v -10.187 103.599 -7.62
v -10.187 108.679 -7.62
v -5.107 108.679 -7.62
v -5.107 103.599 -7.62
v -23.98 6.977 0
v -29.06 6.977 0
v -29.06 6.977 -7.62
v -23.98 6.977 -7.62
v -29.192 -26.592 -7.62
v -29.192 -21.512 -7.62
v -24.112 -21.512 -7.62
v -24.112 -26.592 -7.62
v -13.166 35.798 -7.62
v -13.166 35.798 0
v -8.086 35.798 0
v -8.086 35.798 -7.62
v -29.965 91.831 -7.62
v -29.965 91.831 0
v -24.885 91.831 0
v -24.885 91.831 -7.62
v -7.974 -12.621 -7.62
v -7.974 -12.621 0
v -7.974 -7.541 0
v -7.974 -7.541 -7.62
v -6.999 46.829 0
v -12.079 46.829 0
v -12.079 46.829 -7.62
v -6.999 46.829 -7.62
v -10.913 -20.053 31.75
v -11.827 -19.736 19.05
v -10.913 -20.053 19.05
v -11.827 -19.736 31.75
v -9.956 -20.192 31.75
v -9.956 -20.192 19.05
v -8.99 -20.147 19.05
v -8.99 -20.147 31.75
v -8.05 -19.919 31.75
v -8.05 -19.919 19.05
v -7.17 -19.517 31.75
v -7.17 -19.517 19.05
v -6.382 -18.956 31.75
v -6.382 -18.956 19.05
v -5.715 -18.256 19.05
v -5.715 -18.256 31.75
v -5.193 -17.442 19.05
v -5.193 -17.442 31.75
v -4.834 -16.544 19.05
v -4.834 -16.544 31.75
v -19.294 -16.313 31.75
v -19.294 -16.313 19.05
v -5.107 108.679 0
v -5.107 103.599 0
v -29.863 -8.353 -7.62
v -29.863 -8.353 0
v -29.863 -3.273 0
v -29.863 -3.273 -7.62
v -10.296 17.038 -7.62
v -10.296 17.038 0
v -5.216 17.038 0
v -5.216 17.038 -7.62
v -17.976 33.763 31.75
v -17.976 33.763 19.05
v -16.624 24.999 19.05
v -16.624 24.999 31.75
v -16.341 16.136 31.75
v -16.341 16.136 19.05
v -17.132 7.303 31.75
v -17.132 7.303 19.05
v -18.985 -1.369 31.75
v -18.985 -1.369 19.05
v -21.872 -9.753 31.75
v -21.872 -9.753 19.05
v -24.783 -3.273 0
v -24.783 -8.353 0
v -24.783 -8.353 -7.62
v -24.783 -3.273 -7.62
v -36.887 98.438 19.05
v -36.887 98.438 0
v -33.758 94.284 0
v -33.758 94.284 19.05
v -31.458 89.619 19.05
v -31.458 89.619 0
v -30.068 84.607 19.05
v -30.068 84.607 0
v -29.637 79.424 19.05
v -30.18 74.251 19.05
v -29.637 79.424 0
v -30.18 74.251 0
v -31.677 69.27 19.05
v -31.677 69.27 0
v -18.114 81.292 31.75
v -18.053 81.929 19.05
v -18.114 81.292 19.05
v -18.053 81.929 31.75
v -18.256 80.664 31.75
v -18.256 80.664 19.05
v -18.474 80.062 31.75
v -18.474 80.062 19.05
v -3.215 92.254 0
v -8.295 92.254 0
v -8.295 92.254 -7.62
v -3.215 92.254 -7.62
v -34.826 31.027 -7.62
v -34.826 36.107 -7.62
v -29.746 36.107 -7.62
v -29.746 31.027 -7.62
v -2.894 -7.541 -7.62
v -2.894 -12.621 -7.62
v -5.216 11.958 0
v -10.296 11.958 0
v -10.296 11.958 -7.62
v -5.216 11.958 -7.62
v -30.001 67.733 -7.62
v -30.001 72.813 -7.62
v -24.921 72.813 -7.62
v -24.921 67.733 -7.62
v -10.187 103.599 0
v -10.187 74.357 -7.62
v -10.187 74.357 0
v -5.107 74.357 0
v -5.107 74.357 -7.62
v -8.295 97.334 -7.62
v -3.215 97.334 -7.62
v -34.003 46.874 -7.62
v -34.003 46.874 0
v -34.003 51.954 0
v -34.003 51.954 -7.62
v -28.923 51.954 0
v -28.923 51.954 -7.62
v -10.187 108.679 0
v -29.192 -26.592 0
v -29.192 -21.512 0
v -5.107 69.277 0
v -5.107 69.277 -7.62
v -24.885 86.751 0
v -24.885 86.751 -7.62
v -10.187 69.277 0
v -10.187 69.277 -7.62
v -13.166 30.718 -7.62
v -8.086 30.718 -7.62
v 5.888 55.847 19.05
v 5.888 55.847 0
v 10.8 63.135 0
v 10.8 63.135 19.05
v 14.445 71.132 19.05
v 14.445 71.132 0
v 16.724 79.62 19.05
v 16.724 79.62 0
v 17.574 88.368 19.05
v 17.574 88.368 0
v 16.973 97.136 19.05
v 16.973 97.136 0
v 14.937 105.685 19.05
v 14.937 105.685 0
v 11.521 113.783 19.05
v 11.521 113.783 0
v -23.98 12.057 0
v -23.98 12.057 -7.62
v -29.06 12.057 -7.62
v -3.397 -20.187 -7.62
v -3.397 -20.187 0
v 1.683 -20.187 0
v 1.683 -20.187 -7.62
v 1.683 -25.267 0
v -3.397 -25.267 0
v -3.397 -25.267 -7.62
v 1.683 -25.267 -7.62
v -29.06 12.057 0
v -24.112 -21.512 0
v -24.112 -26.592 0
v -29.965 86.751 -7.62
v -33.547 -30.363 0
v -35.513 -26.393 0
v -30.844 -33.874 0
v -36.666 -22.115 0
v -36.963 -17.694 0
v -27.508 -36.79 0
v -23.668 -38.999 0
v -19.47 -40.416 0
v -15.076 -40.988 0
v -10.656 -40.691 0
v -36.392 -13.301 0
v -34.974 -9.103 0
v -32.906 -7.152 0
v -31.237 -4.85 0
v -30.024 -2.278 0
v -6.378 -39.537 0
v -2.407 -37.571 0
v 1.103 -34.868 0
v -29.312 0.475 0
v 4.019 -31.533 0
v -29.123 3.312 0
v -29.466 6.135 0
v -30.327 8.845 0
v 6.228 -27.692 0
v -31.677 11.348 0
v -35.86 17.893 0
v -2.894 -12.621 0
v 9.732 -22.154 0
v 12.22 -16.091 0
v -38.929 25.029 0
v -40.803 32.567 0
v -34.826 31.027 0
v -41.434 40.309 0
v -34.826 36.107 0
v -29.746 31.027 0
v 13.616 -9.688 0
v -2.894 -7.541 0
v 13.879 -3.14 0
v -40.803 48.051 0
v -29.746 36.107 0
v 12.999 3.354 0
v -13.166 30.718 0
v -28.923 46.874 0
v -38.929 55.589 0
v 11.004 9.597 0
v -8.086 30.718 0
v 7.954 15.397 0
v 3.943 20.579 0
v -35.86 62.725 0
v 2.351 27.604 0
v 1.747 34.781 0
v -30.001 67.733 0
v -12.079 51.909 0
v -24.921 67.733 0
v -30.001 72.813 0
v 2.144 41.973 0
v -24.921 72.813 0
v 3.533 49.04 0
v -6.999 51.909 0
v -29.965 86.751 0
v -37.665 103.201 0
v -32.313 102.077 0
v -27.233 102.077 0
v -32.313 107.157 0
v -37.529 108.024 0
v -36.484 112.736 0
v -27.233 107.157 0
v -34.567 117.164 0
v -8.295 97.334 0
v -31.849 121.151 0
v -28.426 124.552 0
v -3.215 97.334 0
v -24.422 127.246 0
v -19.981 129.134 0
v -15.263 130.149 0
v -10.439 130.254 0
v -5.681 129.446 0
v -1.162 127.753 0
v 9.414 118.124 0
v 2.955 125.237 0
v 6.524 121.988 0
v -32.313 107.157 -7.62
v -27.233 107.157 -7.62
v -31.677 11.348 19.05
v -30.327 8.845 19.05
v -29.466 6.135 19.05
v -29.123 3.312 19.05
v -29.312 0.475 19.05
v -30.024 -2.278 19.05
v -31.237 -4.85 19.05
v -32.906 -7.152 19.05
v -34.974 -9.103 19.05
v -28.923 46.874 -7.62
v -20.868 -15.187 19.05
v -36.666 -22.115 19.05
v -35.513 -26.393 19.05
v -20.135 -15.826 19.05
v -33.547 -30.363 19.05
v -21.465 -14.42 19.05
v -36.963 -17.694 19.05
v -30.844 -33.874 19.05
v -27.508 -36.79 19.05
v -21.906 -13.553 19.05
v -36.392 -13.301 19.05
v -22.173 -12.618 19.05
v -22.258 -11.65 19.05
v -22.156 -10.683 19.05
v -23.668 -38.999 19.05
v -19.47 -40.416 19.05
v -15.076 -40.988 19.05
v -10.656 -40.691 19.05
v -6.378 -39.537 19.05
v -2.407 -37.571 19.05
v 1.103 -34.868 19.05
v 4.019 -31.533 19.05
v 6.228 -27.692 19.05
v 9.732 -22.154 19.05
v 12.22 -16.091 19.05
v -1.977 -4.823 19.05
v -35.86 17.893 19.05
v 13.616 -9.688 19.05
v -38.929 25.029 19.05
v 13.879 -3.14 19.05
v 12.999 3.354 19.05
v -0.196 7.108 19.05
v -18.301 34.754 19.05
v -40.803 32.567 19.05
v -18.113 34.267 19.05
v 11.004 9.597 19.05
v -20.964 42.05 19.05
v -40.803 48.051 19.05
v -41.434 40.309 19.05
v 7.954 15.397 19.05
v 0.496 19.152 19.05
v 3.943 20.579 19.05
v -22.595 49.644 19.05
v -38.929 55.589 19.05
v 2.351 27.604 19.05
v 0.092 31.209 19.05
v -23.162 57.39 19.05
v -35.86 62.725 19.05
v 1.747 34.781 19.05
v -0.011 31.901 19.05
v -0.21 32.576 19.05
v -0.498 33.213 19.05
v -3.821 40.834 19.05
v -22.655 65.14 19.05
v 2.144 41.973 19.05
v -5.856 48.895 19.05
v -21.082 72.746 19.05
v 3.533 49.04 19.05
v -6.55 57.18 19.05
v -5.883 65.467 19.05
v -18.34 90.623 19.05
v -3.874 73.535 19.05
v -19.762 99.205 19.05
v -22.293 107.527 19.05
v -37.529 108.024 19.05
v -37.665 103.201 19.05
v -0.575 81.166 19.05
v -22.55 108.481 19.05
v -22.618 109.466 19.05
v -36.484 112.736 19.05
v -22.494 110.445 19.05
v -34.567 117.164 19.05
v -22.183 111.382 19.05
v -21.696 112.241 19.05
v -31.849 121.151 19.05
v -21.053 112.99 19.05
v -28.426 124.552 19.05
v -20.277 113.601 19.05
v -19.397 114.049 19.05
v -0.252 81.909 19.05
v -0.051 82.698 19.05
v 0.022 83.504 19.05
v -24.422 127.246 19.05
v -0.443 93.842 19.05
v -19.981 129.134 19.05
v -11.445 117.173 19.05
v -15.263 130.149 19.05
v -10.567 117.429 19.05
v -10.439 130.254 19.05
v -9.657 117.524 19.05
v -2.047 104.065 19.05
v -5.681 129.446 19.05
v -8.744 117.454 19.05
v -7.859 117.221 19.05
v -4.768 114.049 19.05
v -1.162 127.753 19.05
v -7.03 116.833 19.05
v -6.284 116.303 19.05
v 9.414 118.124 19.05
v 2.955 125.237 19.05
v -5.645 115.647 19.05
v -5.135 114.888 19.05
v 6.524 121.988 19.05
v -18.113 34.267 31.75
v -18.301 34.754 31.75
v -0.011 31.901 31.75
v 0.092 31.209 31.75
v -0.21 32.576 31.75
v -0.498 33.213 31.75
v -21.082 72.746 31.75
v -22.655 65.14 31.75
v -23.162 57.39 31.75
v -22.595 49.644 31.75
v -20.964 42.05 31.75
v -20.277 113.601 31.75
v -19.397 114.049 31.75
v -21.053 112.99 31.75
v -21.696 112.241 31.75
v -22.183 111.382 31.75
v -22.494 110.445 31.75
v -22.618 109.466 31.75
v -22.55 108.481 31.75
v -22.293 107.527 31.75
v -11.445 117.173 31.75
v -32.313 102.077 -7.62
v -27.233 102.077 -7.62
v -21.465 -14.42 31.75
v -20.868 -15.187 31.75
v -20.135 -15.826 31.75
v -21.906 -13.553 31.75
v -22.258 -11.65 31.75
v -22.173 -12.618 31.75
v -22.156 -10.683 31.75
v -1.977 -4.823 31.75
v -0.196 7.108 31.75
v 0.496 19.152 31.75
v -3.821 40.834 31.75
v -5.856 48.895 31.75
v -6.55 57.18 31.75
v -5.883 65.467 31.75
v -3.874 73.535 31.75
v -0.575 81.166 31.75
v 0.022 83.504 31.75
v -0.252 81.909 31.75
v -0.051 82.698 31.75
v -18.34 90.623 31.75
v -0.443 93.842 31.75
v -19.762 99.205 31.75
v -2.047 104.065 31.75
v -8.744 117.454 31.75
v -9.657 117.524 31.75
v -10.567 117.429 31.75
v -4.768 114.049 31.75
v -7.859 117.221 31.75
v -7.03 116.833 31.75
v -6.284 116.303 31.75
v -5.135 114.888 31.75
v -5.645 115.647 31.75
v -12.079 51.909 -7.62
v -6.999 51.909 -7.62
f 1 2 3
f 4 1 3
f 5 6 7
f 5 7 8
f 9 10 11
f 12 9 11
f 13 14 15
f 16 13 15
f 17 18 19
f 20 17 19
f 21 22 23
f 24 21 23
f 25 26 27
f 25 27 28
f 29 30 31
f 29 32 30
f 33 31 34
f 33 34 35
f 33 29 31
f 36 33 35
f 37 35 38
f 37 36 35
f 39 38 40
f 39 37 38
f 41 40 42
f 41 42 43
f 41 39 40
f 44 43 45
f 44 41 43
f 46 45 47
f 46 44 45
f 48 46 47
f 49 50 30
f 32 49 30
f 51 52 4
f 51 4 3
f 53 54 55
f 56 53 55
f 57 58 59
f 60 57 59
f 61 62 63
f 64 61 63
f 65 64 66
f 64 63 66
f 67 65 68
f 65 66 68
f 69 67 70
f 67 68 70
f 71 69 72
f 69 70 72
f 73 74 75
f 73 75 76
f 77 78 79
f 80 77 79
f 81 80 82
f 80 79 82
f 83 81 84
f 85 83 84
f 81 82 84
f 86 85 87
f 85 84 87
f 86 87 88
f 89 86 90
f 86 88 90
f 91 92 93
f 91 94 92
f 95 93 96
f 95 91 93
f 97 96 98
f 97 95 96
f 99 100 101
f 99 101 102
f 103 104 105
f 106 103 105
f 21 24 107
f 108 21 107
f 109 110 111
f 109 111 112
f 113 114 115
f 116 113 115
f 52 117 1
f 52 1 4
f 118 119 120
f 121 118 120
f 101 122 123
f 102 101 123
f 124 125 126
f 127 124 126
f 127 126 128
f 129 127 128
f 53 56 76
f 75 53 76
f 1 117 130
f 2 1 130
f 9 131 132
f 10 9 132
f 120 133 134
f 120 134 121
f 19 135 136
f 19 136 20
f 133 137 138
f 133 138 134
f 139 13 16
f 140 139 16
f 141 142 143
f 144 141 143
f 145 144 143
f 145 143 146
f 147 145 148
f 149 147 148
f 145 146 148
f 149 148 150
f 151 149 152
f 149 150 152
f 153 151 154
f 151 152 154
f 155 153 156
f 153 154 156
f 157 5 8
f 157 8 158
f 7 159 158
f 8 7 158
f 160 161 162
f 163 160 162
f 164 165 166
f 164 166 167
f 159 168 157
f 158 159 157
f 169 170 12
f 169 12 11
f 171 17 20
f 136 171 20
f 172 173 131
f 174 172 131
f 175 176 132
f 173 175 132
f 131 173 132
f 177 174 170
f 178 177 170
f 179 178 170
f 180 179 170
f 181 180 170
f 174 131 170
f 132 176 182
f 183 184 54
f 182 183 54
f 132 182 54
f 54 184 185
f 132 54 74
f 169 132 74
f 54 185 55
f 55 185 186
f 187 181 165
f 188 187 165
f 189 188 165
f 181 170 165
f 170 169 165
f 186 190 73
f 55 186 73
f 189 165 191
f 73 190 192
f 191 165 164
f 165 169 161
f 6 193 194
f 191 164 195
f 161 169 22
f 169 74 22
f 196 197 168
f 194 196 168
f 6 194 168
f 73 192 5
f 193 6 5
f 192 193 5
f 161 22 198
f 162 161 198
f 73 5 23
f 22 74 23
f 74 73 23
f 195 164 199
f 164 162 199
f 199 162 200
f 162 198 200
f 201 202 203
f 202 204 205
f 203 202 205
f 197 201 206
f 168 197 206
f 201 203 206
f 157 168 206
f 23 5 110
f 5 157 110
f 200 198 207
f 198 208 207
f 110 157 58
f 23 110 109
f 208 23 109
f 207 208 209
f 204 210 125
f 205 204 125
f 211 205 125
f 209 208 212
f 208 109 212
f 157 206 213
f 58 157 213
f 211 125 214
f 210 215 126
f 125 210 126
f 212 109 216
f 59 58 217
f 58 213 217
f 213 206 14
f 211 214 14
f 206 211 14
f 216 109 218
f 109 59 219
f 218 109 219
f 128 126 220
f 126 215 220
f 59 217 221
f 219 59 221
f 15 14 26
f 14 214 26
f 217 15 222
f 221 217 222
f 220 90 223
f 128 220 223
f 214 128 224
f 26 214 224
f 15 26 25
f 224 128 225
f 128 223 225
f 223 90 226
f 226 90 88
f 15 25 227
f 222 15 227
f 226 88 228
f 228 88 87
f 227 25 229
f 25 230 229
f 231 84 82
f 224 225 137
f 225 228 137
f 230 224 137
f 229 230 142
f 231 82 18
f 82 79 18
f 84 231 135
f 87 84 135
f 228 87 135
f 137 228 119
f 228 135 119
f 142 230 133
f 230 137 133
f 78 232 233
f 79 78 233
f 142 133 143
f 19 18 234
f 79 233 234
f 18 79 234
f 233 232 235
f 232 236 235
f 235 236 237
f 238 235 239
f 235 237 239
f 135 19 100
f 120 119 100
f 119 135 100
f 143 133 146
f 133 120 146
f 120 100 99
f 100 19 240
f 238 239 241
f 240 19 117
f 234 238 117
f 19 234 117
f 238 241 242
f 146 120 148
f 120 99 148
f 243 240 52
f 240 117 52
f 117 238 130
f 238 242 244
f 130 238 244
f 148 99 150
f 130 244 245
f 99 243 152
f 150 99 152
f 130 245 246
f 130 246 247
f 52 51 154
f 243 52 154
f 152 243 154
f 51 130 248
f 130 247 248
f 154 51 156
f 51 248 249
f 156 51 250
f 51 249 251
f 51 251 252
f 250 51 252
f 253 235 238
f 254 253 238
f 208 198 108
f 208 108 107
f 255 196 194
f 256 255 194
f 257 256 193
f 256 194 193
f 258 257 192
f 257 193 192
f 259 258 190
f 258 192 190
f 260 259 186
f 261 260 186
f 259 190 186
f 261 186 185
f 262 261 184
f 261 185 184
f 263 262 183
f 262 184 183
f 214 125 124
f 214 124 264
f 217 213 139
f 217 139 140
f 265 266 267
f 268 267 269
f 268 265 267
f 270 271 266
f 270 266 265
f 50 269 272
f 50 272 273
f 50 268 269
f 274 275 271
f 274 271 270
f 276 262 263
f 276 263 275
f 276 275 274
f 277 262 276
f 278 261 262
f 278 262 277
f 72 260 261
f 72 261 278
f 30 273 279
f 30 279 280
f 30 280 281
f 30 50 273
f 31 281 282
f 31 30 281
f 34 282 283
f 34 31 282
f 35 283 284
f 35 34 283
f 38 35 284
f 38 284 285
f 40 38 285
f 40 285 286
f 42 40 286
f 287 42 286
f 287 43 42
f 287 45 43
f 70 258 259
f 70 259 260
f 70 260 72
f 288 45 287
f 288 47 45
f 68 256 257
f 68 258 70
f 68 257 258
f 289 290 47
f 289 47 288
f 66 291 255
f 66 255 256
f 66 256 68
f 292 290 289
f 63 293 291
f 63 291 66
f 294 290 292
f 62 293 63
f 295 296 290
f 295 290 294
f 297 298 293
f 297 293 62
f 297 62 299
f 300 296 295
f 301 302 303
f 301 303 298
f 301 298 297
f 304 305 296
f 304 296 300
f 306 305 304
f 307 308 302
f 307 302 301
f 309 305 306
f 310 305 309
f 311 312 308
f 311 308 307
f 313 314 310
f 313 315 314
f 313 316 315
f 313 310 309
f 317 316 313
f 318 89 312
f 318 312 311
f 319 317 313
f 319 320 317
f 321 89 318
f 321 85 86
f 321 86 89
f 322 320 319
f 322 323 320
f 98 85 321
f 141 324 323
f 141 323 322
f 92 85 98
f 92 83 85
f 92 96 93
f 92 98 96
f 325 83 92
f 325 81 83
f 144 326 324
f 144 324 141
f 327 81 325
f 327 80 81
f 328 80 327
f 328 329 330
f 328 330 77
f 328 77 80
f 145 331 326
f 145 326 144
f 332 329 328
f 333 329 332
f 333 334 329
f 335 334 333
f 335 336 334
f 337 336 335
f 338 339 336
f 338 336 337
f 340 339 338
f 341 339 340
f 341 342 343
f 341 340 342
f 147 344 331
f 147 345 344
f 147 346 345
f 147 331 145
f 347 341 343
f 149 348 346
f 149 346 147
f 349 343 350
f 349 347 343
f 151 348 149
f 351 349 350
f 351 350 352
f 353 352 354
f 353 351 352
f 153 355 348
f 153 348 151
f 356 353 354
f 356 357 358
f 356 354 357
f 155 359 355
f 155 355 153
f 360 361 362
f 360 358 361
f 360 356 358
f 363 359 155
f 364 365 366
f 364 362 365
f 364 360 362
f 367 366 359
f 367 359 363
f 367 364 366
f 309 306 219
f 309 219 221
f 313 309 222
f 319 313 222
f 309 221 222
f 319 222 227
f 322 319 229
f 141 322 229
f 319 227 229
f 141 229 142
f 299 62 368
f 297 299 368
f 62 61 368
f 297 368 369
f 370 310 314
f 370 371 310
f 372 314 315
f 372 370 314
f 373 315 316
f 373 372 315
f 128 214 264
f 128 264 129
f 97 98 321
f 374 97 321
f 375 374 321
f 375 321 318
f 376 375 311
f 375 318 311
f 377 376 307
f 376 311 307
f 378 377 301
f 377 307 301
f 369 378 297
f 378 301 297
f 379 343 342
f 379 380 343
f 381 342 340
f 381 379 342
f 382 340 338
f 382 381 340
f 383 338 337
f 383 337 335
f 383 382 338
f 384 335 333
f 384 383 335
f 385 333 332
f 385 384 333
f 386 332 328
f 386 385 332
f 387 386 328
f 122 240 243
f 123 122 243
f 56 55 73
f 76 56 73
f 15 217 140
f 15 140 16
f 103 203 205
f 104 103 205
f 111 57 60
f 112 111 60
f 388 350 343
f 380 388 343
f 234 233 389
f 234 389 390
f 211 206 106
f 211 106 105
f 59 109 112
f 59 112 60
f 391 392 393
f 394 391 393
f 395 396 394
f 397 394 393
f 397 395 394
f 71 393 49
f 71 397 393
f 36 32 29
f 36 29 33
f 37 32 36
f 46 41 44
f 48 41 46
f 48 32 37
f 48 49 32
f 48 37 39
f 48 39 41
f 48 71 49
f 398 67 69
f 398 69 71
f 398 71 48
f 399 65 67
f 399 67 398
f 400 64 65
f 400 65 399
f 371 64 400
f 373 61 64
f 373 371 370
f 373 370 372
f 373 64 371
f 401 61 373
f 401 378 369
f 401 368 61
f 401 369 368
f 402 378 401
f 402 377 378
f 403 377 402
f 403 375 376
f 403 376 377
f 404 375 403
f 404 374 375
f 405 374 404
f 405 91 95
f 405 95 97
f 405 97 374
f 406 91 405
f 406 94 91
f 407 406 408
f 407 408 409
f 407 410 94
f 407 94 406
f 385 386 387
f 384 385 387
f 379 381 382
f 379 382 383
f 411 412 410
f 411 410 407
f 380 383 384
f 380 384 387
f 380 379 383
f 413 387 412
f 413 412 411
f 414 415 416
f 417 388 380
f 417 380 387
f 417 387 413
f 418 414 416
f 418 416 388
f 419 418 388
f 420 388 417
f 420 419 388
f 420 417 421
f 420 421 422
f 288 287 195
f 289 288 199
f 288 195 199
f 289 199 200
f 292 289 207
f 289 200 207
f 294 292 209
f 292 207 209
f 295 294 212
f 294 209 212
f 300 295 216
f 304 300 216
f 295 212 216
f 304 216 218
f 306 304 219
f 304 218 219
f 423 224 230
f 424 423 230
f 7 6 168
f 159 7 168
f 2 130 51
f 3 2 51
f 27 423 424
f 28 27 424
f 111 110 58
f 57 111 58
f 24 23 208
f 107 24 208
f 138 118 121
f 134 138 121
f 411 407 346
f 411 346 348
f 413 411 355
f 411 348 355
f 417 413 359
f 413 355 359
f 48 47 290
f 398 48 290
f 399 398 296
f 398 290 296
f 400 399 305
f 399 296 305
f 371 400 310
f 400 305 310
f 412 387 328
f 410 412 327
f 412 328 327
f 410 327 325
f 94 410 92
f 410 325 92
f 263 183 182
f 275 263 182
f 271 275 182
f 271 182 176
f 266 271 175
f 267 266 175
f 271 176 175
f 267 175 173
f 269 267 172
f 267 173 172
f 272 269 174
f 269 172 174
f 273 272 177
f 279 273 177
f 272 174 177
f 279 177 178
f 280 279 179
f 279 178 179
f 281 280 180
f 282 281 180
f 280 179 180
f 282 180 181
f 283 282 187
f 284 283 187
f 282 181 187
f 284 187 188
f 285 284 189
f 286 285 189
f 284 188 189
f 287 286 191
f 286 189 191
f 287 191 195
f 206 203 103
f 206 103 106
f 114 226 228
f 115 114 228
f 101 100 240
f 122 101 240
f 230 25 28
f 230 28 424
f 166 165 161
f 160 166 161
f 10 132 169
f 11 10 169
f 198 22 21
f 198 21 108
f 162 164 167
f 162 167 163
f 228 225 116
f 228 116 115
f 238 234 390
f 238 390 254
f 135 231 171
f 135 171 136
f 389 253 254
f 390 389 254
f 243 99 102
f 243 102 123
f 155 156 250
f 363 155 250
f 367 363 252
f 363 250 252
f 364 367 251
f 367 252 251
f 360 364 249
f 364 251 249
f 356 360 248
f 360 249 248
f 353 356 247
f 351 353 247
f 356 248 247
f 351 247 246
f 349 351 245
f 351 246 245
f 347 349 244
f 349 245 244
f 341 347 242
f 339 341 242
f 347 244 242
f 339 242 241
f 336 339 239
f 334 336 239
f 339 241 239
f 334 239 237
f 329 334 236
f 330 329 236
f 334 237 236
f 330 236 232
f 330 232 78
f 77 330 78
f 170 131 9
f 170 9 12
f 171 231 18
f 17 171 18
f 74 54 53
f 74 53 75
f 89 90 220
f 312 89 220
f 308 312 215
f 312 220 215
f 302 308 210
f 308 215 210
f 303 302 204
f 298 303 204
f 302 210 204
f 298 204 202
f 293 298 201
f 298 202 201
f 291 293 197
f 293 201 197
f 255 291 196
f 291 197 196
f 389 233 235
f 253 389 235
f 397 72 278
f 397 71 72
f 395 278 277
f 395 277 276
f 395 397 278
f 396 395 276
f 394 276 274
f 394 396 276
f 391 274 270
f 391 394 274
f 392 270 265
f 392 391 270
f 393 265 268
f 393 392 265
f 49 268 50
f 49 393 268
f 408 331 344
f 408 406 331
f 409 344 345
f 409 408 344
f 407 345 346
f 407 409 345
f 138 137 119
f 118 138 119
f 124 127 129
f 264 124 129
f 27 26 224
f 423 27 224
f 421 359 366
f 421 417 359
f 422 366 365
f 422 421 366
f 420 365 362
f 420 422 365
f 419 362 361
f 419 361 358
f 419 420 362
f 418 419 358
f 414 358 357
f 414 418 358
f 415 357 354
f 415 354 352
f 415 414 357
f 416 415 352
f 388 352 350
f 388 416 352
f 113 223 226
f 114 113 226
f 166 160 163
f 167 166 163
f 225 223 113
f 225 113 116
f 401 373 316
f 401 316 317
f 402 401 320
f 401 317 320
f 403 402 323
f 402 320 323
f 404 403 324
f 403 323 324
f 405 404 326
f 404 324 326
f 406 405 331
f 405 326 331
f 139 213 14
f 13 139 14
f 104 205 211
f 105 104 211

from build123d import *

# Parameters (mm, degrees)
F1_DEPTH = 19.05
F3_DEPTH = 12.7
F4_R     = 5.08
F5_W     = 5.08
F5_H     = 5.08
F6_DEPTH = 7.62


# Not quite as in the source:
# - a feature names something its author has since deleted; it is built from what else it names


with BuildPart() as f1:
    # F0 (on Top) → F1 (new body)
    with BuildSketch(Plane.XY):
        with BuildLine():
            ThreePointArc((-31.6769881083, 69.2702680826), (-41.4338257439, 40.3089202009), (-31.6769881083, 11.3475723192))
            Line((-31.6769881083, 11.3475723192), (3.9428002201, 20.5794945359))
            ThreePointArc((3.9428002201, 20.5794945359), (1.8207183061, 38.3838132659), (5.8883237652, 55.8466762304))
            Line((5.8883237652, 55.8466762304), (-31.6769881083, 69.2702680826))
        make_face()
        with BuildLine():
            ThreePointArc((-36.8869205419, 98.4383374453), (-30.0684968554, 84.6069006975), (-31.6769881083, 69.2702680826))
            Line((-31.6769881083, 69.2702680826), (5.8883237652, 55.8466762304))
            ThreePointArc((5.8883237652, 55.8466762304), (17.3296867389, 83.976336418), (11.5213459358, 113.7831434608))
            Line((11.5213459358, 113.7831434608), (-36.8869205419, 98.4383374453))
        make_face()
        with BuildLine():
            ThreePointArc((-31.6769881083, 11.3475723192), (-29.3116483225, 0.4750905822), (-34.9744334817, -9.1029340401))
            Line((-34.9744334817, -9.1029340401), (6.2283230945, -27.6920832694))
            ThreePointArc((6.2283230945, -27.6920832694), (13.878530495, -3.1399721265), (3.9428002201, 20.5794945359))
            Line((3.9428002201, 20.5794945359), (-31.6769881083, 11.3475723192))
        make_face()
        with BuildLine():
            Line((6.2283230945, -27.6920832694), (-34.9744334817, -9.1029340401))
            ThreePointArc((-34.9744334817, -9.1029340401), (-23.6676298082, -38.9988869429), (6.2283230945, -27.6920832694))
        make_face()
        with BuildLine():
            ThreePointArc((11.5213459358, 113.7831434608), (-19.9807860054, 129.1337402603), (-36.8869205419, 98.4383374453))
            Line((-36.8869205419, 98.4383374453), (11.5213459358, 113.7831434608))
        make_face()
    extrude(amount=F1_DEPTH)

    # F2 (on face) → F3 (join)
    with BuildSketch(Plane.XY.offset(19.05)):
        with BuildLine():
            ThreePointArc((-18.0934686214, 34.295540303), (-16.8286909738, 9.5468310574), (-23.8906592131, -14.2066292465))
            Line((-23.8906592131, -14.2066292465), (-6.6029457375, -22.1301615238))
            ThreePointArc((-6.6029457375, -22.1301615238), (-0.4607343944, 4.7449741554), (0, 32.3092155159))
            Line((0, 32.3092155159), (-18.0934686214, 34.295540303))
        make_face()
        with BuildLine():
            ThreePointArc((-18.0934686214, 80.9150189161), (-23.162661248, 57.6052796096), (-18.0934686214, 34.295540303))
            Line((-18.0934686214, 34.295540303), (0, 32.3092155159))
            ThreePointArc((0, 32.3092155159), (-6.5501688565, 57.2618860751), (0, 82.2145566344))
            ThreePointArc((0, 82.2145566344), (-1.439849547, 100.9781554163), (-6.6029457375, 119.0747916698))
            Line((-6.6029457375, 119.0747916698), (-24.2383088917, 112.1475473046))
            ThreePointArc((-24.2383088917, 112.1475473046), (-19.2665441206, 96.9049694563), (-18.0934686214, 80.9150189161))
        make_face()
    extrude(amount=F3_DEPTH)

    # F4
    f4_edges = [f1.edges().sort_by_distance(p)[0] for p in [
        (-23.890659, -14.206629, 25.4),
        (-6.602946, -22.130162, 25.4),
        (-6.602946, 119.074792, 25.4),
        (-24.238309, 112.147547, 25.4),
        (0, 82.214557, 25.4),
        (0, 32.309216, 25.4),
        (-18.093469, 80.915019, 25.4),
        (-18.093469, 34.29554, 25.4),
    ]]
    fillet(f4_edges, radius=F4_R)

    # F5 (on Top) → F6 (join)
    with BuildSketch(Plane.XY):
        with Locations((-26.6524679592, -24.0524802357)):
            Rectangle(F5_W, F5_H)
        with Locations((-0.8571739626, -22.7268876201)):
            Rectangle(F5_W, F5_H)
        with Locations((-27.3225028068, -5.8132838458)):
            Rectangle(F5_W, F5_H)
        with Locations((-5.4335221648, -10.0806634873)):
            Rectangle(F5_W, F5_H)
        with Locations((-26.5202838928, 9.5173716545)):
            Rectangle(F5_W, F5_H)
        with Locations((-7.7564124949, 14.4977606833)):
            Rectangle(F5_W, F5_H)
        with Locations((-32.2857946157, 33.5665121675)):
            Rectangle(F5_W, F5_H)
        with Locations((-10.6263644993, 33.2580432296)):
            Rectangle(F5_W, F5_H)
        with Locations((-31.4632356167, 49.4136251509)):
            Rectangle(F5_W, F5_H)
        with Locations((-9.5391534269, 49.3687652051)):
            Rectangle(F5_W, F5_H)
        with Locations((-27.4613853544, 70.2730193734)):
            Rectangle(F5_W, F5_H)
        with Locations((-7.6474579982, 71.8173533678)):
            Rectangle(F5_W, F5_H)
        with Locations((-27.4252351373, 89.291498065)):
            Rectangle(F5_W, F5_H)
        with Locations((-5.7547562756, 94.7942361236)):
            Rectangle(F5_W, F5_H)
        with Locations((-29.7734234482, 104.6168133616)):
            Rectangle(F5_W, F5_H)
        with Locations((-7.6474579982, 106.1389820957)):
            Rectangle(F5_W, F5_H)
    extrude(amount=-F6_DEPTH)


solid = f1.part
